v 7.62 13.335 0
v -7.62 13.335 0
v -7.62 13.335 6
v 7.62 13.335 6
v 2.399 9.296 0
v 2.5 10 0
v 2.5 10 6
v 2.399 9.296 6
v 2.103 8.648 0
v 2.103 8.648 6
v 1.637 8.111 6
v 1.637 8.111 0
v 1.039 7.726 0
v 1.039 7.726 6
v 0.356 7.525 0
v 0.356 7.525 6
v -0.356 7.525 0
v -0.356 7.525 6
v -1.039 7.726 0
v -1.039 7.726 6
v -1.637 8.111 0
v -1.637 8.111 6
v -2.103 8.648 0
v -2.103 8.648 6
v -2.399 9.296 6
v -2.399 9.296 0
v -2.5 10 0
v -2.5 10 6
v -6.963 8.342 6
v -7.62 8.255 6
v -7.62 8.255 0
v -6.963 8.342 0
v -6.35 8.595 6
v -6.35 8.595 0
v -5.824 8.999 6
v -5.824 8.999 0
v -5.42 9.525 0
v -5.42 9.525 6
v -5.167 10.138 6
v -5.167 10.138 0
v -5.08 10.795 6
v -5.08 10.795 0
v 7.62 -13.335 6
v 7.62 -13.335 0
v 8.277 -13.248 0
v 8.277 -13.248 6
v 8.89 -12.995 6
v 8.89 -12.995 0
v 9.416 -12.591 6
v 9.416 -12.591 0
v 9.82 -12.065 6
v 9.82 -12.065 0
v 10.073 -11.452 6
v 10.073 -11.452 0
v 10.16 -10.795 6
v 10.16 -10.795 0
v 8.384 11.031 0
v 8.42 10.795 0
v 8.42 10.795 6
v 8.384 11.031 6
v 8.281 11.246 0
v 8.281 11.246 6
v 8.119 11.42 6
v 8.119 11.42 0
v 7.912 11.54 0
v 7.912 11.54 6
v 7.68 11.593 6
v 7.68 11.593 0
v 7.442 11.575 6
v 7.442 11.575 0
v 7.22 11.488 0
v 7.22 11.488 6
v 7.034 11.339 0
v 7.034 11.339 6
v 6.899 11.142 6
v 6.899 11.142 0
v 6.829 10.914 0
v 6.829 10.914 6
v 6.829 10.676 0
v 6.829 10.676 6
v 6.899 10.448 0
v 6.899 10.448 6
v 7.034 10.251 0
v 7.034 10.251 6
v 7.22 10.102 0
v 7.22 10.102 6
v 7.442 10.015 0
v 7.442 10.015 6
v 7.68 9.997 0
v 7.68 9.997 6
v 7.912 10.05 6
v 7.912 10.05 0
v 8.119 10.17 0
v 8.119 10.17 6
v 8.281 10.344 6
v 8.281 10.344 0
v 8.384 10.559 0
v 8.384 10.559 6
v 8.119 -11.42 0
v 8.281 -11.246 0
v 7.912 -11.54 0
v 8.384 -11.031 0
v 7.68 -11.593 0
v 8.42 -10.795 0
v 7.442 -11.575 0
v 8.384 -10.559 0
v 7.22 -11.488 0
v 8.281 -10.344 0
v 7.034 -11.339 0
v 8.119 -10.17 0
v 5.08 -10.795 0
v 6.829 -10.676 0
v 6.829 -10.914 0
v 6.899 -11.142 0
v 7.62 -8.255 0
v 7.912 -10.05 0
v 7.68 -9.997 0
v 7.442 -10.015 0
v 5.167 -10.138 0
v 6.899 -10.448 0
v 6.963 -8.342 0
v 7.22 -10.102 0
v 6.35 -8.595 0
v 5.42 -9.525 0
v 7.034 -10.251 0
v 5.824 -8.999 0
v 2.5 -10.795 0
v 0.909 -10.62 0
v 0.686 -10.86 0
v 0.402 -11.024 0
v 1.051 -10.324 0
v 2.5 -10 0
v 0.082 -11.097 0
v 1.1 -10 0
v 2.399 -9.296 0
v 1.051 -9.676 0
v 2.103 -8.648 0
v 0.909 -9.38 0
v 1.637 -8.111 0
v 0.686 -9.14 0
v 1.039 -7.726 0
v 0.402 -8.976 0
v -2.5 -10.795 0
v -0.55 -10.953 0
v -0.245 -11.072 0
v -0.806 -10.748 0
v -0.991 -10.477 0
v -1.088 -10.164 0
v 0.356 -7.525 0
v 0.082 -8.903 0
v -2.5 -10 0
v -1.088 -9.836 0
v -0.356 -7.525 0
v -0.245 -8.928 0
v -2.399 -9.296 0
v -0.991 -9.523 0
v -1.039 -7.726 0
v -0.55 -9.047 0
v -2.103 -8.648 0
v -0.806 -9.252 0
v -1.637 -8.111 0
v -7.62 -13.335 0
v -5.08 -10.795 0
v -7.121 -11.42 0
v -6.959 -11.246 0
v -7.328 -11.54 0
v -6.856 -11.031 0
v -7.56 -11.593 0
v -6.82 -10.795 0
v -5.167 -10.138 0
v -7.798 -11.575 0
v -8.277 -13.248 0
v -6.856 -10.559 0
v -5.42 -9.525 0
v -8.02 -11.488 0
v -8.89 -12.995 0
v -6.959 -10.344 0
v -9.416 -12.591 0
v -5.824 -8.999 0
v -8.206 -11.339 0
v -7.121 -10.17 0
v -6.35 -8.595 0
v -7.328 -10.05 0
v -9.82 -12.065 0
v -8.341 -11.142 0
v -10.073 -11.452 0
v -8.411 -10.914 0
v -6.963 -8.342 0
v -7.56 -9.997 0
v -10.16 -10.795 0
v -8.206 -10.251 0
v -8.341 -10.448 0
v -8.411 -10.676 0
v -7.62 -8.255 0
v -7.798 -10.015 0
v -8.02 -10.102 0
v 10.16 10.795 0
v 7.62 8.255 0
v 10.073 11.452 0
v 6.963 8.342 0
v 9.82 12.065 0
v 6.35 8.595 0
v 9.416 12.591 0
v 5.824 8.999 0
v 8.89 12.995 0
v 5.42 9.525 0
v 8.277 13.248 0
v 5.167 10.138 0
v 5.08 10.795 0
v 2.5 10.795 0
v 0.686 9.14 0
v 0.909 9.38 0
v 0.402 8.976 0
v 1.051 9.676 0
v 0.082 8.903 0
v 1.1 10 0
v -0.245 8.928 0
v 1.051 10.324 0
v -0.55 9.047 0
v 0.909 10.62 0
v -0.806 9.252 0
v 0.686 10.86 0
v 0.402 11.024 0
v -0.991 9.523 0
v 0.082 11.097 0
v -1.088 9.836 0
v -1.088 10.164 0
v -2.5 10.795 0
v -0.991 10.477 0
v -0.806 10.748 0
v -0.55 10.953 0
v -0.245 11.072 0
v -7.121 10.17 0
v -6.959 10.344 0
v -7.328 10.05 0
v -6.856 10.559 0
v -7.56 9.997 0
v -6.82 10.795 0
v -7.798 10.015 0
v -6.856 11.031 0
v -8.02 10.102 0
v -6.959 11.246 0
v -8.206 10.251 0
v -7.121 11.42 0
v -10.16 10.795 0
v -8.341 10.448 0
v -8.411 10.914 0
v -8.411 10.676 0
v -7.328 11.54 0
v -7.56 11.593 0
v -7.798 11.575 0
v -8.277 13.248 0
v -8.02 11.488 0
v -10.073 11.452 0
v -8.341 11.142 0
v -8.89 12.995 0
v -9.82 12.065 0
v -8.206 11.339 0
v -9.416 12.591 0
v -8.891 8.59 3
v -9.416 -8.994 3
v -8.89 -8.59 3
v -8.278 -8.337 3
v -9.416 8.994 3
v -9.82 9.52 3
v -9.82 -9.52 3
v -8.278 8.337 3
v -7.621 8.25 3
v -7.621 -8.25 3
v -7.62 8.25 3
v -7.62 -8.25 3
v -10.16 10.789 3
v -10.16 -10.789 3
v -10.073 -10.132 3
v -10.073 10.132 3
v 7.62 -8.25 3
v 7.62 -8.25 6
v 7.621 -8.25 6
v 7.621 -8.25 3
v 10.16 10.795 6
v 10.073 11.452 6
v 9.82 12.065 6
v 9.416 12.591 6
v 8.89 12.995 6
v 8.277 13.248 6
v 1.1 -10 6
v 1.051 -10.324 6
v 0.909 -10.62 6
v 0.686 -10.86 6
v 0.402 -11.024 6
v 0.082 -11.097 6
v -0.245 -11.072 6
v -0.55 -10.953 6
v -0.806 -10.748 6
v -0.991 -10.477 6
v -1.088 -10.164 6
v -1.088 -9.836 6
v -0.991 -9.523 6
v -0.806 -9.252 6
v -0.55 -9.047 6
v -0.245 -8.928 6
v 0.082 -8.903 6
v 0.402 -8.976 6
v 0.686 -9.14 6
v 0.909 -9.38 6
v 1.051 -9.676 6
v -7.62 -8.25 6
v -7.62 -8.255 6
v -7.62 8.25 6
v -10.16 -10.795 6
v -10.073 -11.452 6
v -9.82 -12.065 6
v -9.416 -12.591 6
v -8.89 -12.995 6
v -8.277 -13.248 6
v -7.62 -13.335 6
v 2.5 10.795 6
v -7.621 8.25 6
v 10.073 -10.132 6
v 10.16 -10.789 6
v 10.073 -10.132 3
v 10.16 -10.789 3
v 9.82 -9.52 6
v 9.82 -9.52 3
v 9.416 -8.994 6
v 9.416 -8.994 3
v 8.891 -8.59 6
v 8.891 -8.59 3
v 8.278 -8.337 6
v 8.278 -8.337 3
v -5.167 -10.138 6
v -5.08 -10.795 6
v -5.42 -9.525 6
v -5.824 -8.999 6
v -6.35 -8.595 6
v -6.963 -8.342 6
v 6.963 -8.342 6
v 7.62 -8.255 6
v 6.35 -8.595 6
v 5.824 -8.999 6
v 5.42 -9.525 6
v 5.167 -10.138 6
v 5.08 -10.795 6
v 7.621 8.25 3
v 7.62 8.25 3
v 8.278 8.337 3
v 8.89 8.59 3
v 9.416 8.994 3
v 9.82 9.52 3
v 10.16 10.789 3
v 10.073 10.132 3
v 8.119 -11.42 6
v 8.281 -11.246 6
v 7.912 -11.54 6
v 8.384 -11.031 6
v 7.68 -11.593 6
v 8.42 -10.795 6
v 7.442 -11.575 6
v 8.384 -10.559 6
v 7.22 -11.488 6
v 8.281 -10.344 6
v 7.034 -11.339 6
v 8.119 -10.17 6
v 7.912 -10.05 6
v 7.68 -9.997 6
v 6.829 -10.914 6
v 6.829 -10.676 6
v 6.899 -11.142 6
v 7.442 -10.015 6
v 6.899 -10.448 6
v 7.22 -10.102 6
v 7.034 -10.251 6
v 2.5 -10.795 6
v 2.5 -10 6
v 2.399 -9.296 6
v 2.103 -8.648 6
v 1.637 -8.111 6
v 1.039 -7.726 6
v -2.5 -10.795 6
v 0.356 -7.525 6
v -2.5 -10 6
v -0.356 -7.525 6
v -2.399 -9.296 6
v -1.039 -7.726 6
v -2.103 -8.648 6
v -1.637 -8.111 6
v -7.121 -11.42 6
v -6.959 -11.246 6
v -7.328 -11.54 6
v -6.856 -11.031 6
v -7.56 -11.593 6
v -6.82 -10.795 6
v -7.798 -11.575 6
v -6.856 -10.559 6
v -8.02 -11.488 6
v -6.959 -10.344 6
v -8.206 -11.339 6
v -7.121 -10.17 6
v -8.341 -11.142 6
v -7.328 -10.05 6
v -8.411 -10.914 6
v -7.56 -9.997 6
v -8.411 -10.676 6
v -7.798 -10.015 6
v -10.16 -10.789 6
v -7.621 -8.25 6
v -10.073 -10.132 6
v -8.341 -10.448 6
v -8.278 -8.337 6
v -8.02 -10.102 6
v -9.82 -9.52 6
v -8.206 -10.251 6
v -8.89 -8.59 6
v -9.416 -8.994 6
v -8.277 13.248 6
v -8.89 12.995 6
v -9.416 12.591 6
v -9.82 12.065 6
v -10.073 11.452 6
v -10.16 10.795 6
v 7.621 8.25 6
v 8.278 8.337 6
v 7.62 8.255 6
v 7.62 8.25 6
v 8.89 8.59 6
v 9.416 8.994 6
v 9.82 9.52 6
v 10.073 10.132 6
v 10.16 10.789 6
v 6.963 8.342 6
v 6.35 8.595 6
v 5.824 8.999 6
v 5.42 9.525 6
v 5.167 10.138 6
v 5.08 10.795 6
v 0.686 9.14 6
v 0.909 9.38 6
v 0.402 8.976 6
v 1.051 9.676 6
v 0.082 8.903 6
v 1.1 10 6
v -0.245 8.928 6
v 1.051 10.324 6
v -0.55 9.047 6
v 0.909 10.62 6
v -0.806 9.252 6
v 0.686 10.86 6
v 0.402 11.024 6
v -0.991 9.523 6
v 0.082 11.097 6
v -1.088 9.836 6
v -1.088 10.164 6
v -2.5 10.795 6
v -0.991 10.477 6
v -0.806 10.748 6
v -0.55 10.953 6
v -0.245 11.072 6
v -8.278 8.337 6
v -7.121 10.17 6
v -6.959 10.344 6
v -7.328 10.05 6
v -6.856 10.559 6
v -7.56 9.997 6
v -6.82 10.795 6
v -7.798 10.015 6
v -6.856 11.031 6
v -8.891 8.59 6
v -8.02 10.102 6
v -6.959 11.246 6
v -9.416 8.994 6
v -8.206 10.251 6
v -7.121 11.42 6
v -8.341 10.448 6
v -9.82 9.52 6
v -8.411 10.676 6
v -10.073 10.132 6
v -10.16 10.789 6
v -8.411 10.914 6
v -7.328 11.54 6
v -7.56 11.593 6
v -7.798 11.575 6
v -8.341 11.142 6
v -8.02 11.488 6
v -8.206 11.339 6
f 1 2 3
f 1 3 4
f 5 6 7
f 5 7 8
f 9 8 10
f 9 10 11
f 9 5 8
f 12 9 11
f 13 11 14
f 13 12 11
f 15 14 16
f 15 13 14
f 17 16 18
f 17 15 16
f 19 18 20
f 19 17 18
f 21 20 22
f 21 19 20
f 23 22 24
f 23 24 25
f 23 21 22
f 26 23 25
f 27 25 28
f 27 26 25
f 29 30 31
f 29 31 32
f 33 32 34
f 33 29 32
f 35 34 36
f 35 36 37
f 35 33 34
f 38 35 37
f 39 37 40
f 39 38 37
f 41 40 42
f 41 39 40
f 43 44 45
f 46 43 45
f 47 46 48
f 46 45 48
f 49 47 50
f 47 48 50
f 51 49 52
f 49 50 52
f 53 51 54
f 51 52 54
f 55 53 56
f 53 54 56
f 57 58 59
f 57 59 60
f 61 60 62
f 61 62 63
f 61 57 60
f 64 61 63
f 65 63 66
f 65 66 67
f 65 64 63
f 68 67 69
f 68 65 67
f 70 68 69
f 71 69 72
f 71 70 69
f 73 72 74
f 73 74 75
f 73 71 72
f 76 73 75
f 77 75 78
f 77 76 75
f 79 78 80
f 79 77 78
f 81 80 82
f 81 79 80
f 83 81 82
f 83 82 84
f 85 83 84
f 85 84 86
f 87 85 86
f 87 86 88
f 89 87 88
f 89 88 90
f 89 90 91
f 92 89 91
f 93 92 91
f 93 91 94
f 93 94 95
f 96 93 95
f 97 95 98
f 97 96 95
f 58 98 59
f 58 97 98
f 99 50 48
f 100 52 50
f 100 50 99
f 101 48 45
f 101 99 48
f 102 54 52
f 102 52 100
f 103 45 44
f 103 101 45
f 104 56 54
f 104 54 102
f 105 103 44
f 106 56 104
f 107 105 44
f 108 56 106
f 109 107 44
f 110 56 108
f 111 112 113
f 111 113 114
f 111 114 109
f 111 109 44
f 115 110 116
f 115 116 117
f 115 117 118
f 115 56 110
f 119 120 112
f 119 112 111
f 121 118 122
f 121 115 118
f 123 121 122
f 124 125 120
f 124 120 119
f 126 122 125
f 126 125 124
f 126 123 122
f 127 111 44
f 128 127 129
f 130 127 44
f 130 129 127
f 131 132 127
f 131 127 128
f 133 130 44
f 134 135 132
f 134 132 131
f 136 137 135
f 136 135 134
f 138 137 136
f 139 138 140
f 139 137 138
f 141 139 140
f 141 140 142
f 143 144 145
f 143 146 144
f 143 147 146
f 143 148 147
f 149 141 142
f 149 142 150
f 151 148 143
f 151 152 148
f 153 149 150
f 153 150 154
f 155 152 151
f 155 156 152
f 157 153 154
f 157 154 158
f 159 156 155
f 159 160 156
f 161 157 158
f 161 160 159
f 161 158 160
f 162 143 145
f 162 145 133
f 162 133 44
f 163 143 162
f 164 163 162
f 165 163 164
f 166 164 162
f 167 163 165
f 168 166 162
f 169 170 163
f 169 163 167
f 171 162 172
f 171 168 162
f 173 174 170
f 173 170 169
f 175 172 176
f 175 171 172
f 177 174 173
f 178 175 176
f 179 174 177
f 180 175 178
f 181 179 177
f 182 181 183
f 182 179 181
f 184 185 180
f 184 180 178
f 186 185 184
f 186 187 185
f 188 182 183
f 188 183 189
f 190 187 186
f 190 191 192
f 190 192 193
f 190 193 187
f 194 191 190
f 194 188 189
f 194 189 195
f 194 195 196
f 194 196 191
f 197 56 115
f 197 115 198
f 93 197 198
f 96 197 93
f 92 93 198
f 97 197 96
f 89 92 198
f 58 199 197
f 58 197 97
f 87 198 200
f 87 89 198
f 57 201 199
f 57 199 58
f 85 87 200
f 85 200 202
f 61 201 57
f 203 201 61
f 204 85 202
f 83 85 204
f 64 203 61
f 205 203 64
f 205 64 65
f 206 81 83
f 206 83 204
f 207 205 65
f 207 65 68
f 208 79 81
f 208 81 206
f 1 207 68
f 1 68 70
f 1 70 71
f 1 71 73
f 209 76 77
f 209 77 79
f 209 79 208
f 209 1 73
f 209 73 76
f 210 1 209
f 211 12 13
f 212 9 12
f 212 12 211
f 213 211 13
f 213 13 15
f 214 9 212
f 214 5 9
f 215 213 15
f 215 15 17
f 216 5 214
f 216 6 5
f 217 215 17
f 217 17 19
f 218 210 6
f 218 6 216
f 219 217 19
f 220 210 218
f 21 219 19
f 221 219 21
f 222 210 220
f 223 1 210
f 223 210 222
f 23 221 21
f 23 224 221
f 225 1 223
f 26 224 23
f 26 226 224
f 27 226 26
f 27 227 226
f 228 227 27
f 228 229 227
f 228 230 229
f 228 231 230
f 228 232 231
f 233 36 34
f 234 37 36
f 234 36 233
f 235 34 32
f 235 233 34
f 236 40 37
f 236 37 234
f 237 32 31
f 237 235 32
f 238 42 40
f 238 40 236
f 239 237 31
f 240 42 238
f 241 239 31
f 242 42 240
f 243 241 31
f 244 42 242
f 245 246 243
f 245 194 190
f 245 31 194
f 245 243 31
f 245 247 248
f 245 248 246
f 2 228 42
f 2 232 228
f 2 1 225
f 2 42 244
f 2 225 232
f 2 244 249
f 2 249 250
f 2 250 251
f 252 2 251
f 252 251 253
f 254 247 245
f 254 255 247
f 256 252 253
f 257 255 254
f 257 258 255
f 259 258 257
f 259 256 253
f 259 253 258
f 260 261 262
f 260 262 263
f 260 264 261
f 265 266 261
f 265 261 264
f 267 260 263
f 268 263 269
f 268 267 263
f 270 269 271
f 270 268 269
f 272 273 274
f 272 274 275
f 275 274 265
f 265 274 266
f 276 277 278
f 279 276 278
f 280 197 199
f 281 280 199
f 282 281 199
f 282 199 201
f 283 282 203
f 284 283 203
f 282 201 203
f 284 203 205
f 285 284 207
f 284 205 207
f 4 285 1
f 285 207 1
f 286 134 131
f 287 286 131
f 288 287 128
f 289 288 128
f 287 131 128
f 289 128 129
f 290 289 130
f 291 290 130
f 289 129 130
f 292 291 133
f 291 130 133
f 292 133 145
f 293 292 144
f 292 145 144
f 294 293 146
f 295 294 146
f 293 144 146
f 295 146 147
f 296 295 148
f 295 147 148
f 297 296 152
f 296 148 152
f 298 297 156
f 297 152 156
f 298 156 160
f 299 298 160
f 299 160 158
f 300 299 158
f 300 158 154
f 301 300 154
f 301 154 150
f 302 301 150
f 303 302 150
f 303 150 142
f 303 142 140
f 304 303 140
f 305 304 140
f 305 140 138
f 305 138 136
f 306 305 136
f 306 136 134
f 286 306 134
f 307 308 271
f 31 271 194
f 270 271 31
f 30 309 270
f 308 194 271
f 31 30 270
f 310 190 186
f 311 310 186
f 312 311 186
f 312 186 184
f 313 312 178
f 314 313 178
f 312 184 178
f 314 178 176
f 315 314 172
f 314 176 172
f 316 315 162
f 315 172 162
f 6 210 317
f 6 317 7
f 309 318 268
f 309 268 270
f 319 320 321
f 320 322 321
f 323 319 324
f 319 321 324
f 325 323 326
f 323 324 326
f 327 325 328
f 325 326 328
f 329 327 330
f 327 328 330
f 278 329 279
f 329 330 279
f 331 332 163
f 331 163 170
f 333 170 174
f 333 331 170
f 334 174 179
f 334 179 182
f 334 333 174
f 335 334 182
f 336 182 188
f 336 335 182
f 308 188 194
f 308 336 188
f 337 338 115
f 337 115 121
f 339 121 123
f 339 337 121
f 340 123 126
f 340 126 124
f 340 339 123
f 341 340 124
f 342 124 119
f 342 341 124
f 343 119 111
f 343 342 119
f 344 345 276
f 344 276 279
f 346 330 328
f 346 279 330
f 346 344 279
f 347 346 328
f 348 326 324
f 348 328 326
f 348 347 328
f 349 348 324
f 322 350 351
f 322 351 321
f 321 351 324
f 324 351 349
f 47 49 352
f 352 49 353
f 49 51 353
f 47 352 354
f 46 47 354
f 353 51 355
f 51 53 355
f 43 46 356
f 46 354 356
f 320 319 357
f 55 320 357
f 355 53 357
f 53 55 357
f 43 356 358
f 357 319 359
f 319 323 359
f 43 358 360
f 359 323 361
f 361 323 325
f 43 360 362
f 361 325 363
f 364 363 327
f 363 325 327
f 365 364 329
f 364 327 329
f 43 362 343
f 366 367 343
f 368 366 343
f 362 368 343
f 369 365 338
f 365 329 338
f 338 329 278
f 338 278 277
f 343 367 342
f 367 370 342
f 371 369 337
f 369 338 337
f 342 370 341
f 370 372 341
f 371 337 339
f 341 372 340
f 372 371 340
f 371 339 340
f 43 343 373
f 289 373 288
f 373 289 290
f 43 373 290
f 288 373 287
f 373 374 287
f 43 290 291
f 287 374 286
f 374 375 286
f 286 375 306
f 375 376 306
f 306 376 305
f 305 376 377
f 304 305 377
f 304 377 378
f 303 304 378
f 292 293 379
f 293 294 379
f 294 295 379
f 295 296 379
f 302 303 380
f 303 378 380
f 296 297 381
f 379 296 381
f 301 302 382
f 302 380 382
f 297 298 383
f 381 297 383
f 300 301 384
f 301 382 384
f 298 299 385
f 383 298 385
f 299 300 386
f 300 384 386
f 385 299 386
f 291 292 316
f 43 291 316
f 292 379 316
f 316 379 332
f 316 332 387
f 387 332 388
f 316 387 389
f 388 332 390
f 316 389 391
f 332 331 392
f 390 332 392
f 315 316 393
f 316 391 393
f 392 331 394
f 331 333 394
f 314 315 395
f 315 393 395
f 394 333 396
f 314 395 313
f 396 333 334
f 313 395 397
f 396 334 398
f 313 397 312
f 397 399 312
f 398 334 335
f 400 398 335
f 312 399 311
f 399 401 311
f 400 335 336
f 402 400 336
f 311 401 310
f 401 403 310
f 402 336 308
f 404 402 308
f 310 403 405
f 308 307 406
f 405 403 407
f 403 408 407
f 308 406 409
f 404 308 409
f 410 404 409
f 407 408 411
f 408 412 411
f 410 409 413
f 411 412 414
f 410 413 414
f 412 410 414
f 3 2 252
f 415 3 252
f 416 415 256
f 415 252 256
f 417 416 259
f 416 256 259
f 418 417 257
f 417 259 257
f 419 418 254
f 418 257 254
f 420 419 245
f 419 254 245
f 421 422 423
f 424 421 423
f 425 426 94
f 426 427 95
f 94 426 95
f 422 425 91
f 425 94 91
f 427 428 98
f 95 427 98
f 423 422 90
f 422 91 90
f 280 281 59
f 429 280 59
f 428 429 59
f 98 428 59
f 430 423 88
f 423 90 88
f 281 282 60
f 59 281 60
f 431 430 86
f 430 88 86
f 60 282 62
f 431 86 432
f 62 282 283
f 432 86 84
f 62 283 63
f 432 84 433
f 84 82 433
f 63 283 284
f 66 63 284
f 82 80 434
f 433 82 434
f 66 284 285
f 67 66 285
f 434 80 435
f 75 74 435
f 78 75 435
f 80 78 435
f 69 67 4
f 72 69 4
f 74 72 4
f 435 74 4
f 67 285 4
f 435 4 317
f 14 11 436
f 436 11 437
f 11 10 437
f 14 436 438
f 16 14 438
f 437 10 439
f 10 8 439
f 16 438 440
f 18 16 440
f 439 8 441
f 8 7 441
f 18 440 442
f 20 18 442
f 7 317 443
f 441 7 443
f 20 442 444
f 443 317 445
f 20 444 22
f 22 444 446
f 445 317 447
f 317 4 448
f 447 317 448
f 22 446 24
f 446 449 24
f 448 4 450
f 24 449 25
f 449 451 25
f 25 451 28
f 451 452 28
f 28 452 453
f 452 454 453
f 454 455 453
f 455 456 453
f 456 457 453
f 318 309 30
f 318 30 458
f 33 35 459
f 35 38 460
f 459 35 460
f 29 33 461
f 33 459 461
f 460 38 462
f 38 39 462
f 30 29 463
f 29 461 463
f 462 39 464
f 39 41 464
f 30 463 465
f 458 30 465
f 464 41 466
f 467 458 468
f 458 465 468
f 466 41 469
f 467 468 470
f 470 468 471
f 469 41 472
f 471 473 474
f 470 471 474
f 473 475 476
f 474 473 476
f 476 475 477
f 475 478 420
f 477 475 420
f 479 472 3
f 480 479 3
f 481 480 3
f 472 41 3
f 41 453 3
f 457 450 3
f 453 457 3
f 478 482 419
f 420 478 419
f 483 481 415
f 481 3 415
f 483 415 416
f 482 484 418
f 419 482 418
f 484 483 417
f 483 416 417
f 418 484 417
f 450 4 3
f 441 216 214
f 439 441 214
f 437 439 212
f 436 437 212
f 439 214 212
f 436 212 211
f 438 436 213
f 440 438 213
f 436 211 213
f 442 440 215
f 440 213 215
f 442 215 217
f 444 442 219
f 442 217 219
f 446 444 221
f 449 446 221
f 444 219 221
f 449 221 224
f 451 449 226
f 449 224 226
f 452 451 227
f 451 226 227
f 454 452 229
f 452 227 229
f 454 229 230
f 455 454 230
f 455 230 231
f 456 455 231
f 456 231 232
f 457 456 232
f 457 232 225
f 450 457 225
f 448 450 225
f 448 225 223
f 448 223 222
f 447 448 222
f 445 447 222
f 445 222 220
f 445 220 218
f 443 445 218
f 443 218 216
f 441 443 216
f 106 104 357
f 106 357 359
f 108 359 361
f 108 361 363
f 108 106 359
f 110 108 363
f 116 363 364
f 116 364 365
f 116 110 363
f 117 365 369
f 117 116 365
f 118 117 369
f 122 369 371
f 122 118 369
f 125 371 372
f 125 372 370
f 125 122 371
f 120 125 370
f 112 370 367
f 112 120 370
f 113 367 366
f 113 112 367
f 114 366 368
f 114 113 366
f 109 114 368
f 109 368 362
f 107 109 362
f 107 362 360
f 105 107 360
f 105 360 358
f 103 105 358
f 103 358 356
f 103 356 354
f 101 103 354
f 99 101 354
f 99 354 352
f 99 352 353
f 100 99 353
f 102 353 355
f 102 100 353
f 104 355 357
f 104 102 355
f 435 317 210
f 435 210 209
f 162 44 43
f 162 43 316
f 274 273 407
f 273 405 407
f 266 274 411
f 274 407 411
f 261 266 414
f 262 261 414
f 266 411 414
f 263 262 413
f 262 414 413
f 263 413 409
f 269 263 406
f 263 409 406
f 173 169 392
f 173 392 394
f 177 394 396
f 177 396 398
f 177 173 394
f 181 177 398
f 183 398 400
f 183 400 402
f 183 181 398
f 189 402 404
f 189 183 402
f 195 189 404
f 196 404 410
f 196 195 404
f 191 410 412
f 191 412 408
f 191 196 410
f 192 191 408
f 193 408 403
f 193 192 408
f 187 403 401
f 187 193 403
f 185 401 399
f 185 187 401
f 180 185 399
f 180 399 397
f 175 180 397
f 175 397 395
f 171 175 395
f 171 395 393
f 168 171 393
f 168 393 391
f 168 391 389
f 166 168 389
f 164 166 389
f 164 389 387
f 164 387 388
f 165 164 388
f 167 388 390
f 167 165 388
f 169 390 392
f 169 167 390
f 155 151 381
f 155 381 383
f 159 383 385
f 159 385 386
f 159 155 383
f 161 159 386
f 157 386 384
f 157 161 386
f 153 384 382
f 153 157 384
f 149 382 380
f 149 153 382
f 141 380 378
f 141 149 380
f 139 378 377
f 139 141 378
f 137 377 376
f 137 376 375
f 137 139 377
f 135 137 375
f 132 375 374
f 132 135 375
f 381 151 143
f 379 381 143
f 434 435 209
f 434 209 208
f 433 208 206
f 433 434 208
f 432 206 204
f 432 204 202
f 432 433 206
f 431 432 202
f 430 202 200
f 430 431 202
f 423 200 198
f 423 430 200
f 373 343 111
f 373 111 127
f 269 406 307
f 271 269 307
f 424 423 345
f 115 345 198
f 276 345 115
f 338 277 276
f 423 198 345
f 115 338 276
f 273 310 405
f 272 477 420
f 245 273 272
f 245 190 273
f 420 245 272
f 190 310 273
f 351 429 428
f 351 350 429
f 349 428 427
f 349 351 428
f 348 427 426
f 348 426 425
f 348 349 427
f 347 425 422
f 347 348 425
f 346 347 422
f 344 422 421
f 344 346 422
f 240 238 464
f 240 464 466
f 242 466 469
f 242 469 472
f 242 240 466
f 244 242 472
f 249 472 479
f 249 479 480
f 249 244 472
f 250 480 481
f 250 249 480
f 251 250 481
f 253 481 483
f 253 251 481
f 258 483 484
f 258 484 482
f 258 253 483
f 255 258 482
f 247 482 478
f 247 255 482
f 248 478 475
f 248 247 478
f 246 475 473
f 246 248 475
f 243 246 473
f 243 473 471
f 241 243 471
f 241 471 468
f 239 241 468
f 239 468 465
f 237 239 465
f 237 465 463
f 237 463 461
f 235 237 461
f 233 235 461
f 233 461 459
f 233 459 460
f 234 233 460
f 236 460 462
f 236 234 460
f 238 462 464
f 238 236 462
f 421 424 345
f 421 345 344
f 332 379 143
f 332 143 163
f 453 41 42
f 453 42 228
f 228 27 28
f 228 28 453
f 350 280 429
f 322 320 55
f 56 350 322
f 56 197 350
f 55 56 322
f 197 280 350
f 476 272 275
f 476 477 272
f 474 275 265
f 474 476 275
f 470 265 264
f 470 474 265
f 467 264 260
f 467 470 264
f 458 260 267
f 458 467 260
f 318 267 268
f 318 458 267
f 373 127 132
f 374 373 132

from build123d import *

# Parameters (mm, degrees)
SKETCH_R        = 0.8
PAD_DEPTH       = 6
POCKET_DEPTH    = 6.001
SKETCH002_W     = 22
SKETCH002_H     = 16.5
POCKET001_DEPTH = 3
FILLET_R        = 2.539
PAD001_DEPTH    = 6
SKETCH004_R     = 1.1
POCKET002_DEPTH = 6.001


with BuildPart() as part:
    # Sketch → Pad (new body)
    with BuildSketch(Plane.XY):
        with BuildLine():
            Line((-7.62, 13.335), (7.62, 13.335))
            ThreePointArc((10.16, 10.795), (9.416051, 12.591051), (7.62, 13.335))
            Line((10.16, 10.795), (10.16, -10.795))
            ThreePointArc((7.62, -13.335), (9.416051, -12.591051), (10.16, -10.795))
            Line((7.62, -13.335), (-7.62, -13.335))
            ThreePointArc((-10.16, -10.795), (-9.416051, -12.591051), (-7.62, -13.335))
            Line((-10.16, -10.795), (-10.16, 10.795))
            ThreePointArc((-7.62, 13.335), (-9.416051, 12.591051), (-10.16, 10.795))
        make_face()
        with Locations((-7.62, 10.795)):
            Circle(SKETCH_R, mode=Mode.SUBTRACT)
        with Locations((-7.62, -10.795)):
            Circle(SKETCH_R, mode=Mode.SUBTRACT)
        with Locations((7.62, -10.795)):
            Circle(SKETCH_R, mode=Mode.SUBTRACT)
        with Locations((7.62, 10.795)):
            Circle(SKETCH_R, mode=Mode.SUBTRACT)
    extrude(amount=PAD_DEPTH)

    # Sketch001 (on Face14 of Pad) → Pocket (cut, through all)
    with BuildSketch(Plane.XY.offset(6)):
        with BuildLine():
            Line((-5.08, 10.795), (5.08, 10.795))
            ThreePointArc((5.08, 10.795), (5.823949, 8.998949), (7.62, 8.255))
            Line((7.62, 8.255), (7.62, -8.255))
            ThreePointArc((7.62, -8.255), (5.823949, -8.998949), (5.08, -10.795))
            Line((5.08, -10.795), (-5.08, -10.795))
            ThreePointArc((-5.08, -10.795), (-5.823949, -8.998949), (-7.62, -8.255))
            Line((-7.62, -8.255), (-7.62, 8.255))
            ThreePointArc((-7.62, 8.255), (-5.823949, 8.998949), (-5.08, 10.795))
        make_face()
    extrude(amount=-POCKET_DEPTH, mode=Mode.SUBTRACT)

    # Sketch002 (on Face5 of Pocket) → Pocket001 (cut)
    with BuildSketch(Plane.XY.offset(6)):
        Rectangle(SKETCH002_W, SKETCH002_H)
    extrude(amount=-POCKET001_DEPTH, mode=Mode.SUBTRACT)

    # Fillet
    fillet_edges = [part.edges().sort_by_distance(p)[0] for p in [
        (-10.16, 8.25, 4.5),
        (-10.16, -8.25, 4.5),
        (10.16, 8.25, 4.5),
        (10.16, -8.25, 4.5),
    ]]
    fillet(fillet_edges, radius=FILLET_R)

    # Sketch003 (on Face6 of Fillet) → Pad001 (join)
    with BuildSketch(Plane(origin=(0, 0, 0), x_dir=(1, 0, 0), z_dir=(0, 0, -1))):
        with BuildLine():
            Line((-2.5, 10.8), (2.5, 10.8))
            Line((2.5, 10.8), (2.5, 10))
            ThreePointArc((-2.5, 10), (0, 7.5), (2.5, 10))
            Line((-2.5, 10), (-2.5, 10.8))
        make_face()
        with BuildLine():
            Line((-2.5, -10.8), (2.5, -10.8))
            Line((2.5, -10.8), (2.5, -10))
            ThreePointArc((2.5, -10), (0, -7.5), (-2.5, -10))
            Line((-2.5, -10), (-2.5, -10.8))
        make_face()
    extrude(amount=-PAD001_DEPTH)

    # Sketch004 (on Face44 of Pad001) → Pocket002 (cut, through all)
    with BuildSketch(Plane(origin=(0, 0, 0), x_dir=(1, 0, 0), z_dir=(0, 0, -1))):
        with Locations((0, 10)):
            Circle(SKETCH004_R)
        with Locations((0, -10)):
            Circle(SKETCH004_R)
    extrude(amount=-POCKET002_DEPTH, mode=Mode.SUBTRACT)


solid = part.part
